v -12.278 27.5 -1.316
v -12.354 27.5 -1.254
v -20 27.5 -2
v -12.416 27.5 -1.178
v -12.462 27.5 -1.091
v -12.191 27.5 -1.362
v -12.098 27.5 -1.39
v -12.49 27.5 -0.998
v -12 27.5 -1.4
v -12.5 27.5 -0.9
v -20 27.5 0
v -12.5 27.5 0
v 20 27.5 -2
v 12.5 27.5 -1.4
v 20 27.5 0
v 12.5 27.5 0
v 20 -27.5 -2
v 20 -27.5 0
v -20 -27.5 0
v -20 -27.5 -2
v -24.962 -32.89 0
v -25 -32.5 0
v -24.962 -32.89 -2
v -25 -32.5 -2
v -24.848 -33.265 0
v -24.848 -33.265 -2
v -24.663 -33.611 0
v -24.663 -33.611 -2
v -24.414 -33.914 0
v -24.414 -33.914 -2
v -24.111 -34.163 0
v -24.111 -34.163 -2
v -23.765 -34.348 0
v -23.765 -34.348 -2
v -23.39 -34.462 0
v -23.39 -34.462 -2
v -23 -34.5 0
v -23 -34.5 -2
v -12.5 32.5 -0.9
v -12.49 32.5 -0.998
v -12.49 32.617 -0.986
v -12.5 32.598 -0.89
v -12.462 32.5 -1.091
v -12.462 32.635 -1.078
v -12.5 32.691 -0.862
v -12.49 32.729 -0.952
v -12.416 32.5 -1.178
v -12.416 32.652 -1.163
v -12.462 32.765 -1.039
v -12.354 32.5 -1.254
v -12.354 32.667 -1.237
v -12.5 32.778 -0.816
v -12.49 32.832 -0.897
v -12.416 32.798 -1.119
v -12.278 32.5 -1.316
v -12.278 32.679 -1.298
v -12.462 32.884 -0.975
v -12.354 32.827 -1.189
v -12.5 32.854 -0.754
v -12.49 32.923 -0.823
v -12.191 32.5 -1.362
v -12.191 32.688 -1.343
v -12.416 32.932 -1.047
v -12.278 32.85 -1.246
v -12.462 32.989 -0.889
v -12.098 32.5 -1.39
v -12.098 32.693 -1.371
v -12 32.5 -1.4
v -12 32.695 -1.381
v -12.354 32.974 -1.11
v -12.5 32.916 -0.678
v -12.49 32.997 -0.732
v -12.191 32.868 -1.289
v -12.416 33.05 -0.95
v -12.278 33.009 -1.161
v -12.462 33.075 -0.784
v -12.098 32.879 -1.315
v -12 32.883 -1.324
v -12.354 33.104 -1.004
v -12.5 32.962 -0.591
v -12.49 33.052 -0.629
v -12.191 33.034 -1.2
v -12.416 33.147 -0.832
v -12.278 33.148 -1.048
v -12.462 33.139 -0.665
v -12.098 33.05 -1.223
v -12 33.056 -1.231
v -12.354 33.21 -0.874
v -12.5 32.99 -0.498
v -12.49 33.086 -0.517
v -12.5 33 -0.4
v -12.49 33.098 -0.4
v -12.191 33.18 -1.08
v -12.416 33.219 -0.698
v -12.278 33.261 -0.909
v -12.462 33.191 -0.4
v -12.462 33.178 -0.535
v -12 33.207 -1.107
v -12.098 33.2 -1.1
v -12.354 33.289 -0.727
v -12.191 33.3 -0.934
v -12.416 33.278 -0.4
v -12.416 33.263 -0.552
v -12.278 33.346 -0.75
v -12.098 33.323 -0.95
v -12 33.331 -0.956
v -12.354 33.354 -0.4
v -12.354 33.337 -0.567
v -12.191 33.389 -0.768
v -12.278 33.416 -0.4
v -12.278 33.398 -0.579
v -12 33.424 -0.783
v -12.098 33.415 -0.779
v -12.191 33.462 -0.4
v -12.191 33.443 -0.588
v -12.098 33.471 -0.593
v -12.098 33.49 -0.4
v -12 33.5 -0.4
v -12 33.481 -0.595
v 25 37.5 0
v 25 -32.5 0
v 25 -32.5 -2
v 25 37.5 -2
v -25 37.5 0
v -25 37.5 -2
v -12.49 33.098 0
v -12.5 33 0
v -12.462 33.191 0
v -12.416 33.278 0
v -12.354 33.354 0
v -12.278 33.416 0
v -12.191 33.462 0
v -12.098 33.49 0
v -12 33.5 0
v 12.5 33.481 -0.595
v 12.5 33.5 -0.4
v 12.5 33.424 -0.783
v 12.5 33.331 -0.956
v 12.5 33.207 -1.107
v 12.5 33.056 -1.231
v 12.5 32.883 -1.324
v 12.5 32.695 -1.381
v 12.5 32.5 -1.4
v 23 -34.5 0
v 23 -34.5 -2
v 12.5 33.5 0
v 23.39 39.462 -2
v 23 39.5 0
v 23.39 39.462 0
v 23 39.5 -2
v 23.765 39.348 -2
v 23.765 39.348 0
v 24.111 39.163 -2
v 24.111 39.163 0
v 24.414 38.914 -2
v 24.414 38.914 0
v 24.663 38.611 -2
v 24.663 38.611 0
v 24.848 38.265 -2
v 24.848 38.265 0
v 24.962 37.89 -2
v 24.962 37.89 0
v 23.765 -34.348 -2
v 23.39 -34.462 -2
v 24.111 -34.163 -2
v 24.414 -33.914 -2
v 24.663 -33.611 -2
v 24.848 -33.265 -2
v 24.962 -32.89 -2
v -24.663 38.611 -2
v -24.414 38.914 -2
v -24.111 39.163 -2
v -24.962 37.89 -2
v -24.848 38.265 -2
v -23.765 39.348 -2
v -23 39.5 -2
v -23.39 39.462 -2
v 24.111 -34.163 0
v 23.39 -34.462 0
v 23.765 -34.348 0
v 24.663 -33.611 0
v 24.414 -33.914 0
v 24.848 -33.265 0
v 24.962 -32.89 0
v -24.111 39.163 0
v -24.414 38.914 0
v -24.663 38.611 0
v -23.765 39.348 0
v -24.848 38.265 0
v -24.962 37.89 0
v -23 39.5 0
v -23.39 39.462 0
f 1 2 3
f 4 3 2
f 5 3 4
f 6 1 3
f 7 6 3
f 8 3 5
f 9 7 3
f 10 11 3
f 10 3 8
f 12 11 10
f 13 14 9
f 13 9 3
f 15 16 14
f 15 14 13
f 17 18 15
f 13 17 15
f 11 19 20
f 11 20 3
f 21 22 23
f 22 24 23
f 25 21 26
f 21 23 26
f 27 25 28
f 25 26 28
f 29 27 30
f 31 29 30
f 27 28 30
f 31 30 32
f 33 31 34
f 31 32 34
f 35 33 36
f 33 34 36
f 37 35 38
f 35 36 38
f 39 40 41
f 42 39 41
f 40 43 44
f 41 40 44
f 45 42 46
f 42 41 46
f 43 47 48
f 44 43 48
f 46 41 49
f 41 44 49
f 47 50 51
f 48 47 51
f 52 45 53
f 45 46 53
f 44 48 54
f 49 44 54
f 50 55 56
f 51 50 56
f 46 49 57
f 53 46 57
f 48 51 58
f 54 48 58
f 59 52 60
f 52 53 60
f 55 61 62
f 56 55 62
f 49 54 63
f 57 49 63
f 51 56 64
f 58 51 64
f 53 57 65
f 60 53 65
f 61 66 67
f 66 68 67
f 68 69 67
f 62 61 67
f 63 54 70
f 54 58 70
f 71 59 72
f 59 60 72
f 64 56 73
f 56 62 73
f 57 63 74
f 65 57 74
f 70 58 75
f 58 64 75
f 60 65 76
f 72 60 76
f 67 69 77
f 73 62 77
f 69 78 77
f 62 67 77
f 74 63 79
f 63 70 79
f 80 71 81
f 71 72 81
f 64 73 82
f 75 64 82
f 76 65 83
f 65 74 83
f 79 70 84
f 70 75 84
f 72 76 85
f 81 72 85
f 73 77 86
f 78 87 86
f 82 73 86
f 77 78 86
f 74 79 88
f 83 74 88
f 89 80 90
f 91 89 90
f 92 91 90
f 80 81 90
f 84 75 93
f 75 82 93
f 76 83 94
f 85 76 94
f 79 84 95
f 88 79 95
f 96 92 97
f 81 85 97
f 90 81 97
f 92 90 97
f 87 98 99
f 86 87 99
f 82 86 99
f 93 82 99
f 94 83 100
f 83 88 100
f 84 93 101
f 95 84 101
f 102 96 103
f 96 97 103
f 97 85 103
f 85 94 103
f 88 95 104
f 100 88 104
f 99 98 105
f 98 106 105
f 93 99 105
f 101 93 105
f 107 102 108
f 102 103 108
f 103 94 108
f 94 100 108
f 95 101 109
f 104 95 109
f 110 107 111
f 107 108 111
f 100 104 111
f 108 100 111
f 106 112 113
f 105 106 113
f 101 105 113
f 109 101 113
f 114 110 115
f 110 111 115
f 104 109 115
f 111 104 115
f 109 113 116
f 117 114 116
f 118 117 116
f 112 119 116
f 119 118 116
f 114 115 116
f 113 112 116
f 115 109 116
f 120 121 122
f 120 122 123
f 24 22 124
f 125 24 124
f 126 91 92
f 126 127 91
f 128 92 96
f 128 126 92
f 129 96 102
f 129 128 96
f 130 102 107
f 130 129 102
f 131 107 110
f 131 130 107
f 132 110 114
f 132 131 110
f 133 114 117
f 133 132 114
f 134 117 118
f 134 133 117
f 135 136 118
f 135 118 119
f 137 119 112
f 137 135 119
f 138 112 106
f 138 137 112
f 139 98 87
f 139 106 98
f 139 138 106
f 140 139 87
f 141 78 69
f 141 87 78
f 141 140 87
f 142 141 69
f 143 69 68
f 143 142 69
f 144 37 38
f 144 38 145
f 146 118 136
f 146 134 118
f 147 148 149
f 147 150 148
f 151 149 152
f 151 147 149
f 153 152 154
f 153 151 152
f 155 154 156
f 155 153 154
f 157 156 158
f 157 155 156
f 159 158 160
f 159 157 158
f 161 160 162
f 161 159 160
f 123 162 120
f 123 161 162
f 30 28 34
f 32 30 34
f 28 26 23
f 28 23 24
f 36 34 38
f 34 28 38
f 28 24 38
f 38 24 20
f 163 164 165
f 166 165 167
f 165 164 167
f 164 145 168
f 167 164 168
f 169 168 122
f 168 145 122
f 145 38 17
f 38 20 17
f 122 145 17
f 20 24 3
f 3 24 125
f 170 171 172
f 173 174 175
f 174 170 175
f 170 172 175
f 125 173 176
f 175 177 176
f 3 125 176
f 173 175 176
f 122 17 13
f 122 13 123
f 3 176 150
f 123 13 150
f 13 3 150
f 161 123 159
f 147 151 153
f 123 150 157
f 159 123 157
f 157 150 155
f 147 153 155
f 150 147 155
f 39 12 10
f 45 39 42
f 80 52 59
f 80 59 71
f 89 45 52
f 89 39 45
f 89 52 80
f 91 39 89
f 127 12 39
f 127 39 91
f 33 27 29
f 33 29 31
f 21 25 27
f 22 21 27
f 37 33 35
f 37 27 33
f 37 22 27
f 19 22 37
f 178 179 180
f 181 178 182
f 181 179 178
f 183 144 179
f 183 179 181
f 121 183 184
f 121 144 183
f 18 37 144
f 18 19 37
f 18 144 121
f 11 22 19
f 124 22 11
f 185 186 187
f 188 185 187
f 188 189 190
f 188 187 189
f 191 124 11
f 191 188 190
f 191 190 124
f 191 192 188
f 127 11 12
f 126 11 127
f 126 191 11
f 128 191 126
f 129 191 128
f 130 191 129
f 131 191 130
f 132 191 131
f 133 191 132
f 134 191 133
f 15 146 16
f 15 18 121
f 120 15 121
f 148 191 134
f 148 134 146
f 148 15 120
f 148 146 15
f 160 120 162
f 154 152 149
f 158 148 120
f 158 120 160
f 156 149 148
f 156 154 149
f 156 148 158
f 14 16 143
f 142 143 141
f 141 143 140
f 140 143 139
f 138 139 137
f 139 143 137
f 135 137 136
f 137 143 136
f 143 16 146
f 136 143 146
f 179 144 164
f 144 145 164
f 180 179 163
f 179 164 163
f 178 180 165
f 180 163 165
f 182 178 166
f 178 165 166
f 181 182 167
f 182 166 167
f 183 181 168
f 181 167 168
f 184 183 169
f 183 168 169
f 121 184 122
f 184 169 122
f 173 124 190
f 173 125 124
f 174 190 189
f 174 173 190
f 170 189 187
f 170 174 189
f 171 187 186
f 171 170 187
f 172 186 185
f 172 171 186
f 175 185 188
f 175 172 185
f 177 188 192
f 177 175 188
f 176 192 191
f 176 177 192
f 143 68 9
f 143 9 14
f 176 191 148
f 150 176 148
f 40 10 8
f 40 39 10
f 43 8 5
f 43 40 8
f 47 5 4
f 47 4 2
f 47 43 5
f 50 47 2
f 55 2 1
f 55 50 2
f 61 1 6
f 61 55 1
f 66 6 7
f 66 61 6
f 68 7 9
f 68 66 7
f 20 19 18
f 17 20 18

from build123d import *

# Parameters (mm, degrees)
SKETCH_W     = 50
SKETCH_H     = 74
SKETCH_W_2   = 40
SKETCH_H_2   = 55
PAD_DEPTH    = 2
SKETCH001_W  = 25
SKETCH001_H  = 6
POCKET_DEPTH = 1.4
FILLET003_R  = 1
FILLET004_R  = 2
FILLET006_R  = 0.5


with BuildPart() as part:
    # Sketch → Pad (new body)
    with BuildSketch(Plane.XY):
        with Locations((0, 2.5)):
            Rectangle(SKETCH_W, SKETCH_H)
        Rectangle(SKETCH_W_2, SKETCH_H_2, mode=Mode.SUBTRACT)
    extrude(amount=-PAD_DEPTH)

    # Sketch001 → Pocket (cut)
    with BuildSketch(Plane.XY):
        with Locations((0, 30.5)):
            Rectangle(SKETCH001_W, SKETCH001_H)
    extrude(amount=-POCKET_DEPTH, mode=Mode.SUBTRACT)

    # Fillet003
    fillet003_edges = [part.edges().sort_by_distance(p)[0] for p in [
        (0, 33.5, -1.4),
    ]]
    fillet(fillet003_edges, radius=FILLET003_R)

    # Fillet004
    fillet004_edges = [part.edges().sort_by_distance(p)[0] for p in [
        (-25, -34.5, -1),
        (25, -34.5, -1),
        (-25, 39.5, -1),
        (25, 39.5, -1),
    ]]
    fillet(fillet004_edges, radius=FILLET004_R)

    # Fillet006
    fillet006_edges = [part.edges().sort_by_distance(p)[0] for p in [
        (-12.5, 30, -1.4),
        (-12.5, 33.207107, -1.107107),
        (-12.5, 33.5, -0.2),
    ]]
    fillet(fillet006_edges, radius=FILLET006_R)


solid = part.part
